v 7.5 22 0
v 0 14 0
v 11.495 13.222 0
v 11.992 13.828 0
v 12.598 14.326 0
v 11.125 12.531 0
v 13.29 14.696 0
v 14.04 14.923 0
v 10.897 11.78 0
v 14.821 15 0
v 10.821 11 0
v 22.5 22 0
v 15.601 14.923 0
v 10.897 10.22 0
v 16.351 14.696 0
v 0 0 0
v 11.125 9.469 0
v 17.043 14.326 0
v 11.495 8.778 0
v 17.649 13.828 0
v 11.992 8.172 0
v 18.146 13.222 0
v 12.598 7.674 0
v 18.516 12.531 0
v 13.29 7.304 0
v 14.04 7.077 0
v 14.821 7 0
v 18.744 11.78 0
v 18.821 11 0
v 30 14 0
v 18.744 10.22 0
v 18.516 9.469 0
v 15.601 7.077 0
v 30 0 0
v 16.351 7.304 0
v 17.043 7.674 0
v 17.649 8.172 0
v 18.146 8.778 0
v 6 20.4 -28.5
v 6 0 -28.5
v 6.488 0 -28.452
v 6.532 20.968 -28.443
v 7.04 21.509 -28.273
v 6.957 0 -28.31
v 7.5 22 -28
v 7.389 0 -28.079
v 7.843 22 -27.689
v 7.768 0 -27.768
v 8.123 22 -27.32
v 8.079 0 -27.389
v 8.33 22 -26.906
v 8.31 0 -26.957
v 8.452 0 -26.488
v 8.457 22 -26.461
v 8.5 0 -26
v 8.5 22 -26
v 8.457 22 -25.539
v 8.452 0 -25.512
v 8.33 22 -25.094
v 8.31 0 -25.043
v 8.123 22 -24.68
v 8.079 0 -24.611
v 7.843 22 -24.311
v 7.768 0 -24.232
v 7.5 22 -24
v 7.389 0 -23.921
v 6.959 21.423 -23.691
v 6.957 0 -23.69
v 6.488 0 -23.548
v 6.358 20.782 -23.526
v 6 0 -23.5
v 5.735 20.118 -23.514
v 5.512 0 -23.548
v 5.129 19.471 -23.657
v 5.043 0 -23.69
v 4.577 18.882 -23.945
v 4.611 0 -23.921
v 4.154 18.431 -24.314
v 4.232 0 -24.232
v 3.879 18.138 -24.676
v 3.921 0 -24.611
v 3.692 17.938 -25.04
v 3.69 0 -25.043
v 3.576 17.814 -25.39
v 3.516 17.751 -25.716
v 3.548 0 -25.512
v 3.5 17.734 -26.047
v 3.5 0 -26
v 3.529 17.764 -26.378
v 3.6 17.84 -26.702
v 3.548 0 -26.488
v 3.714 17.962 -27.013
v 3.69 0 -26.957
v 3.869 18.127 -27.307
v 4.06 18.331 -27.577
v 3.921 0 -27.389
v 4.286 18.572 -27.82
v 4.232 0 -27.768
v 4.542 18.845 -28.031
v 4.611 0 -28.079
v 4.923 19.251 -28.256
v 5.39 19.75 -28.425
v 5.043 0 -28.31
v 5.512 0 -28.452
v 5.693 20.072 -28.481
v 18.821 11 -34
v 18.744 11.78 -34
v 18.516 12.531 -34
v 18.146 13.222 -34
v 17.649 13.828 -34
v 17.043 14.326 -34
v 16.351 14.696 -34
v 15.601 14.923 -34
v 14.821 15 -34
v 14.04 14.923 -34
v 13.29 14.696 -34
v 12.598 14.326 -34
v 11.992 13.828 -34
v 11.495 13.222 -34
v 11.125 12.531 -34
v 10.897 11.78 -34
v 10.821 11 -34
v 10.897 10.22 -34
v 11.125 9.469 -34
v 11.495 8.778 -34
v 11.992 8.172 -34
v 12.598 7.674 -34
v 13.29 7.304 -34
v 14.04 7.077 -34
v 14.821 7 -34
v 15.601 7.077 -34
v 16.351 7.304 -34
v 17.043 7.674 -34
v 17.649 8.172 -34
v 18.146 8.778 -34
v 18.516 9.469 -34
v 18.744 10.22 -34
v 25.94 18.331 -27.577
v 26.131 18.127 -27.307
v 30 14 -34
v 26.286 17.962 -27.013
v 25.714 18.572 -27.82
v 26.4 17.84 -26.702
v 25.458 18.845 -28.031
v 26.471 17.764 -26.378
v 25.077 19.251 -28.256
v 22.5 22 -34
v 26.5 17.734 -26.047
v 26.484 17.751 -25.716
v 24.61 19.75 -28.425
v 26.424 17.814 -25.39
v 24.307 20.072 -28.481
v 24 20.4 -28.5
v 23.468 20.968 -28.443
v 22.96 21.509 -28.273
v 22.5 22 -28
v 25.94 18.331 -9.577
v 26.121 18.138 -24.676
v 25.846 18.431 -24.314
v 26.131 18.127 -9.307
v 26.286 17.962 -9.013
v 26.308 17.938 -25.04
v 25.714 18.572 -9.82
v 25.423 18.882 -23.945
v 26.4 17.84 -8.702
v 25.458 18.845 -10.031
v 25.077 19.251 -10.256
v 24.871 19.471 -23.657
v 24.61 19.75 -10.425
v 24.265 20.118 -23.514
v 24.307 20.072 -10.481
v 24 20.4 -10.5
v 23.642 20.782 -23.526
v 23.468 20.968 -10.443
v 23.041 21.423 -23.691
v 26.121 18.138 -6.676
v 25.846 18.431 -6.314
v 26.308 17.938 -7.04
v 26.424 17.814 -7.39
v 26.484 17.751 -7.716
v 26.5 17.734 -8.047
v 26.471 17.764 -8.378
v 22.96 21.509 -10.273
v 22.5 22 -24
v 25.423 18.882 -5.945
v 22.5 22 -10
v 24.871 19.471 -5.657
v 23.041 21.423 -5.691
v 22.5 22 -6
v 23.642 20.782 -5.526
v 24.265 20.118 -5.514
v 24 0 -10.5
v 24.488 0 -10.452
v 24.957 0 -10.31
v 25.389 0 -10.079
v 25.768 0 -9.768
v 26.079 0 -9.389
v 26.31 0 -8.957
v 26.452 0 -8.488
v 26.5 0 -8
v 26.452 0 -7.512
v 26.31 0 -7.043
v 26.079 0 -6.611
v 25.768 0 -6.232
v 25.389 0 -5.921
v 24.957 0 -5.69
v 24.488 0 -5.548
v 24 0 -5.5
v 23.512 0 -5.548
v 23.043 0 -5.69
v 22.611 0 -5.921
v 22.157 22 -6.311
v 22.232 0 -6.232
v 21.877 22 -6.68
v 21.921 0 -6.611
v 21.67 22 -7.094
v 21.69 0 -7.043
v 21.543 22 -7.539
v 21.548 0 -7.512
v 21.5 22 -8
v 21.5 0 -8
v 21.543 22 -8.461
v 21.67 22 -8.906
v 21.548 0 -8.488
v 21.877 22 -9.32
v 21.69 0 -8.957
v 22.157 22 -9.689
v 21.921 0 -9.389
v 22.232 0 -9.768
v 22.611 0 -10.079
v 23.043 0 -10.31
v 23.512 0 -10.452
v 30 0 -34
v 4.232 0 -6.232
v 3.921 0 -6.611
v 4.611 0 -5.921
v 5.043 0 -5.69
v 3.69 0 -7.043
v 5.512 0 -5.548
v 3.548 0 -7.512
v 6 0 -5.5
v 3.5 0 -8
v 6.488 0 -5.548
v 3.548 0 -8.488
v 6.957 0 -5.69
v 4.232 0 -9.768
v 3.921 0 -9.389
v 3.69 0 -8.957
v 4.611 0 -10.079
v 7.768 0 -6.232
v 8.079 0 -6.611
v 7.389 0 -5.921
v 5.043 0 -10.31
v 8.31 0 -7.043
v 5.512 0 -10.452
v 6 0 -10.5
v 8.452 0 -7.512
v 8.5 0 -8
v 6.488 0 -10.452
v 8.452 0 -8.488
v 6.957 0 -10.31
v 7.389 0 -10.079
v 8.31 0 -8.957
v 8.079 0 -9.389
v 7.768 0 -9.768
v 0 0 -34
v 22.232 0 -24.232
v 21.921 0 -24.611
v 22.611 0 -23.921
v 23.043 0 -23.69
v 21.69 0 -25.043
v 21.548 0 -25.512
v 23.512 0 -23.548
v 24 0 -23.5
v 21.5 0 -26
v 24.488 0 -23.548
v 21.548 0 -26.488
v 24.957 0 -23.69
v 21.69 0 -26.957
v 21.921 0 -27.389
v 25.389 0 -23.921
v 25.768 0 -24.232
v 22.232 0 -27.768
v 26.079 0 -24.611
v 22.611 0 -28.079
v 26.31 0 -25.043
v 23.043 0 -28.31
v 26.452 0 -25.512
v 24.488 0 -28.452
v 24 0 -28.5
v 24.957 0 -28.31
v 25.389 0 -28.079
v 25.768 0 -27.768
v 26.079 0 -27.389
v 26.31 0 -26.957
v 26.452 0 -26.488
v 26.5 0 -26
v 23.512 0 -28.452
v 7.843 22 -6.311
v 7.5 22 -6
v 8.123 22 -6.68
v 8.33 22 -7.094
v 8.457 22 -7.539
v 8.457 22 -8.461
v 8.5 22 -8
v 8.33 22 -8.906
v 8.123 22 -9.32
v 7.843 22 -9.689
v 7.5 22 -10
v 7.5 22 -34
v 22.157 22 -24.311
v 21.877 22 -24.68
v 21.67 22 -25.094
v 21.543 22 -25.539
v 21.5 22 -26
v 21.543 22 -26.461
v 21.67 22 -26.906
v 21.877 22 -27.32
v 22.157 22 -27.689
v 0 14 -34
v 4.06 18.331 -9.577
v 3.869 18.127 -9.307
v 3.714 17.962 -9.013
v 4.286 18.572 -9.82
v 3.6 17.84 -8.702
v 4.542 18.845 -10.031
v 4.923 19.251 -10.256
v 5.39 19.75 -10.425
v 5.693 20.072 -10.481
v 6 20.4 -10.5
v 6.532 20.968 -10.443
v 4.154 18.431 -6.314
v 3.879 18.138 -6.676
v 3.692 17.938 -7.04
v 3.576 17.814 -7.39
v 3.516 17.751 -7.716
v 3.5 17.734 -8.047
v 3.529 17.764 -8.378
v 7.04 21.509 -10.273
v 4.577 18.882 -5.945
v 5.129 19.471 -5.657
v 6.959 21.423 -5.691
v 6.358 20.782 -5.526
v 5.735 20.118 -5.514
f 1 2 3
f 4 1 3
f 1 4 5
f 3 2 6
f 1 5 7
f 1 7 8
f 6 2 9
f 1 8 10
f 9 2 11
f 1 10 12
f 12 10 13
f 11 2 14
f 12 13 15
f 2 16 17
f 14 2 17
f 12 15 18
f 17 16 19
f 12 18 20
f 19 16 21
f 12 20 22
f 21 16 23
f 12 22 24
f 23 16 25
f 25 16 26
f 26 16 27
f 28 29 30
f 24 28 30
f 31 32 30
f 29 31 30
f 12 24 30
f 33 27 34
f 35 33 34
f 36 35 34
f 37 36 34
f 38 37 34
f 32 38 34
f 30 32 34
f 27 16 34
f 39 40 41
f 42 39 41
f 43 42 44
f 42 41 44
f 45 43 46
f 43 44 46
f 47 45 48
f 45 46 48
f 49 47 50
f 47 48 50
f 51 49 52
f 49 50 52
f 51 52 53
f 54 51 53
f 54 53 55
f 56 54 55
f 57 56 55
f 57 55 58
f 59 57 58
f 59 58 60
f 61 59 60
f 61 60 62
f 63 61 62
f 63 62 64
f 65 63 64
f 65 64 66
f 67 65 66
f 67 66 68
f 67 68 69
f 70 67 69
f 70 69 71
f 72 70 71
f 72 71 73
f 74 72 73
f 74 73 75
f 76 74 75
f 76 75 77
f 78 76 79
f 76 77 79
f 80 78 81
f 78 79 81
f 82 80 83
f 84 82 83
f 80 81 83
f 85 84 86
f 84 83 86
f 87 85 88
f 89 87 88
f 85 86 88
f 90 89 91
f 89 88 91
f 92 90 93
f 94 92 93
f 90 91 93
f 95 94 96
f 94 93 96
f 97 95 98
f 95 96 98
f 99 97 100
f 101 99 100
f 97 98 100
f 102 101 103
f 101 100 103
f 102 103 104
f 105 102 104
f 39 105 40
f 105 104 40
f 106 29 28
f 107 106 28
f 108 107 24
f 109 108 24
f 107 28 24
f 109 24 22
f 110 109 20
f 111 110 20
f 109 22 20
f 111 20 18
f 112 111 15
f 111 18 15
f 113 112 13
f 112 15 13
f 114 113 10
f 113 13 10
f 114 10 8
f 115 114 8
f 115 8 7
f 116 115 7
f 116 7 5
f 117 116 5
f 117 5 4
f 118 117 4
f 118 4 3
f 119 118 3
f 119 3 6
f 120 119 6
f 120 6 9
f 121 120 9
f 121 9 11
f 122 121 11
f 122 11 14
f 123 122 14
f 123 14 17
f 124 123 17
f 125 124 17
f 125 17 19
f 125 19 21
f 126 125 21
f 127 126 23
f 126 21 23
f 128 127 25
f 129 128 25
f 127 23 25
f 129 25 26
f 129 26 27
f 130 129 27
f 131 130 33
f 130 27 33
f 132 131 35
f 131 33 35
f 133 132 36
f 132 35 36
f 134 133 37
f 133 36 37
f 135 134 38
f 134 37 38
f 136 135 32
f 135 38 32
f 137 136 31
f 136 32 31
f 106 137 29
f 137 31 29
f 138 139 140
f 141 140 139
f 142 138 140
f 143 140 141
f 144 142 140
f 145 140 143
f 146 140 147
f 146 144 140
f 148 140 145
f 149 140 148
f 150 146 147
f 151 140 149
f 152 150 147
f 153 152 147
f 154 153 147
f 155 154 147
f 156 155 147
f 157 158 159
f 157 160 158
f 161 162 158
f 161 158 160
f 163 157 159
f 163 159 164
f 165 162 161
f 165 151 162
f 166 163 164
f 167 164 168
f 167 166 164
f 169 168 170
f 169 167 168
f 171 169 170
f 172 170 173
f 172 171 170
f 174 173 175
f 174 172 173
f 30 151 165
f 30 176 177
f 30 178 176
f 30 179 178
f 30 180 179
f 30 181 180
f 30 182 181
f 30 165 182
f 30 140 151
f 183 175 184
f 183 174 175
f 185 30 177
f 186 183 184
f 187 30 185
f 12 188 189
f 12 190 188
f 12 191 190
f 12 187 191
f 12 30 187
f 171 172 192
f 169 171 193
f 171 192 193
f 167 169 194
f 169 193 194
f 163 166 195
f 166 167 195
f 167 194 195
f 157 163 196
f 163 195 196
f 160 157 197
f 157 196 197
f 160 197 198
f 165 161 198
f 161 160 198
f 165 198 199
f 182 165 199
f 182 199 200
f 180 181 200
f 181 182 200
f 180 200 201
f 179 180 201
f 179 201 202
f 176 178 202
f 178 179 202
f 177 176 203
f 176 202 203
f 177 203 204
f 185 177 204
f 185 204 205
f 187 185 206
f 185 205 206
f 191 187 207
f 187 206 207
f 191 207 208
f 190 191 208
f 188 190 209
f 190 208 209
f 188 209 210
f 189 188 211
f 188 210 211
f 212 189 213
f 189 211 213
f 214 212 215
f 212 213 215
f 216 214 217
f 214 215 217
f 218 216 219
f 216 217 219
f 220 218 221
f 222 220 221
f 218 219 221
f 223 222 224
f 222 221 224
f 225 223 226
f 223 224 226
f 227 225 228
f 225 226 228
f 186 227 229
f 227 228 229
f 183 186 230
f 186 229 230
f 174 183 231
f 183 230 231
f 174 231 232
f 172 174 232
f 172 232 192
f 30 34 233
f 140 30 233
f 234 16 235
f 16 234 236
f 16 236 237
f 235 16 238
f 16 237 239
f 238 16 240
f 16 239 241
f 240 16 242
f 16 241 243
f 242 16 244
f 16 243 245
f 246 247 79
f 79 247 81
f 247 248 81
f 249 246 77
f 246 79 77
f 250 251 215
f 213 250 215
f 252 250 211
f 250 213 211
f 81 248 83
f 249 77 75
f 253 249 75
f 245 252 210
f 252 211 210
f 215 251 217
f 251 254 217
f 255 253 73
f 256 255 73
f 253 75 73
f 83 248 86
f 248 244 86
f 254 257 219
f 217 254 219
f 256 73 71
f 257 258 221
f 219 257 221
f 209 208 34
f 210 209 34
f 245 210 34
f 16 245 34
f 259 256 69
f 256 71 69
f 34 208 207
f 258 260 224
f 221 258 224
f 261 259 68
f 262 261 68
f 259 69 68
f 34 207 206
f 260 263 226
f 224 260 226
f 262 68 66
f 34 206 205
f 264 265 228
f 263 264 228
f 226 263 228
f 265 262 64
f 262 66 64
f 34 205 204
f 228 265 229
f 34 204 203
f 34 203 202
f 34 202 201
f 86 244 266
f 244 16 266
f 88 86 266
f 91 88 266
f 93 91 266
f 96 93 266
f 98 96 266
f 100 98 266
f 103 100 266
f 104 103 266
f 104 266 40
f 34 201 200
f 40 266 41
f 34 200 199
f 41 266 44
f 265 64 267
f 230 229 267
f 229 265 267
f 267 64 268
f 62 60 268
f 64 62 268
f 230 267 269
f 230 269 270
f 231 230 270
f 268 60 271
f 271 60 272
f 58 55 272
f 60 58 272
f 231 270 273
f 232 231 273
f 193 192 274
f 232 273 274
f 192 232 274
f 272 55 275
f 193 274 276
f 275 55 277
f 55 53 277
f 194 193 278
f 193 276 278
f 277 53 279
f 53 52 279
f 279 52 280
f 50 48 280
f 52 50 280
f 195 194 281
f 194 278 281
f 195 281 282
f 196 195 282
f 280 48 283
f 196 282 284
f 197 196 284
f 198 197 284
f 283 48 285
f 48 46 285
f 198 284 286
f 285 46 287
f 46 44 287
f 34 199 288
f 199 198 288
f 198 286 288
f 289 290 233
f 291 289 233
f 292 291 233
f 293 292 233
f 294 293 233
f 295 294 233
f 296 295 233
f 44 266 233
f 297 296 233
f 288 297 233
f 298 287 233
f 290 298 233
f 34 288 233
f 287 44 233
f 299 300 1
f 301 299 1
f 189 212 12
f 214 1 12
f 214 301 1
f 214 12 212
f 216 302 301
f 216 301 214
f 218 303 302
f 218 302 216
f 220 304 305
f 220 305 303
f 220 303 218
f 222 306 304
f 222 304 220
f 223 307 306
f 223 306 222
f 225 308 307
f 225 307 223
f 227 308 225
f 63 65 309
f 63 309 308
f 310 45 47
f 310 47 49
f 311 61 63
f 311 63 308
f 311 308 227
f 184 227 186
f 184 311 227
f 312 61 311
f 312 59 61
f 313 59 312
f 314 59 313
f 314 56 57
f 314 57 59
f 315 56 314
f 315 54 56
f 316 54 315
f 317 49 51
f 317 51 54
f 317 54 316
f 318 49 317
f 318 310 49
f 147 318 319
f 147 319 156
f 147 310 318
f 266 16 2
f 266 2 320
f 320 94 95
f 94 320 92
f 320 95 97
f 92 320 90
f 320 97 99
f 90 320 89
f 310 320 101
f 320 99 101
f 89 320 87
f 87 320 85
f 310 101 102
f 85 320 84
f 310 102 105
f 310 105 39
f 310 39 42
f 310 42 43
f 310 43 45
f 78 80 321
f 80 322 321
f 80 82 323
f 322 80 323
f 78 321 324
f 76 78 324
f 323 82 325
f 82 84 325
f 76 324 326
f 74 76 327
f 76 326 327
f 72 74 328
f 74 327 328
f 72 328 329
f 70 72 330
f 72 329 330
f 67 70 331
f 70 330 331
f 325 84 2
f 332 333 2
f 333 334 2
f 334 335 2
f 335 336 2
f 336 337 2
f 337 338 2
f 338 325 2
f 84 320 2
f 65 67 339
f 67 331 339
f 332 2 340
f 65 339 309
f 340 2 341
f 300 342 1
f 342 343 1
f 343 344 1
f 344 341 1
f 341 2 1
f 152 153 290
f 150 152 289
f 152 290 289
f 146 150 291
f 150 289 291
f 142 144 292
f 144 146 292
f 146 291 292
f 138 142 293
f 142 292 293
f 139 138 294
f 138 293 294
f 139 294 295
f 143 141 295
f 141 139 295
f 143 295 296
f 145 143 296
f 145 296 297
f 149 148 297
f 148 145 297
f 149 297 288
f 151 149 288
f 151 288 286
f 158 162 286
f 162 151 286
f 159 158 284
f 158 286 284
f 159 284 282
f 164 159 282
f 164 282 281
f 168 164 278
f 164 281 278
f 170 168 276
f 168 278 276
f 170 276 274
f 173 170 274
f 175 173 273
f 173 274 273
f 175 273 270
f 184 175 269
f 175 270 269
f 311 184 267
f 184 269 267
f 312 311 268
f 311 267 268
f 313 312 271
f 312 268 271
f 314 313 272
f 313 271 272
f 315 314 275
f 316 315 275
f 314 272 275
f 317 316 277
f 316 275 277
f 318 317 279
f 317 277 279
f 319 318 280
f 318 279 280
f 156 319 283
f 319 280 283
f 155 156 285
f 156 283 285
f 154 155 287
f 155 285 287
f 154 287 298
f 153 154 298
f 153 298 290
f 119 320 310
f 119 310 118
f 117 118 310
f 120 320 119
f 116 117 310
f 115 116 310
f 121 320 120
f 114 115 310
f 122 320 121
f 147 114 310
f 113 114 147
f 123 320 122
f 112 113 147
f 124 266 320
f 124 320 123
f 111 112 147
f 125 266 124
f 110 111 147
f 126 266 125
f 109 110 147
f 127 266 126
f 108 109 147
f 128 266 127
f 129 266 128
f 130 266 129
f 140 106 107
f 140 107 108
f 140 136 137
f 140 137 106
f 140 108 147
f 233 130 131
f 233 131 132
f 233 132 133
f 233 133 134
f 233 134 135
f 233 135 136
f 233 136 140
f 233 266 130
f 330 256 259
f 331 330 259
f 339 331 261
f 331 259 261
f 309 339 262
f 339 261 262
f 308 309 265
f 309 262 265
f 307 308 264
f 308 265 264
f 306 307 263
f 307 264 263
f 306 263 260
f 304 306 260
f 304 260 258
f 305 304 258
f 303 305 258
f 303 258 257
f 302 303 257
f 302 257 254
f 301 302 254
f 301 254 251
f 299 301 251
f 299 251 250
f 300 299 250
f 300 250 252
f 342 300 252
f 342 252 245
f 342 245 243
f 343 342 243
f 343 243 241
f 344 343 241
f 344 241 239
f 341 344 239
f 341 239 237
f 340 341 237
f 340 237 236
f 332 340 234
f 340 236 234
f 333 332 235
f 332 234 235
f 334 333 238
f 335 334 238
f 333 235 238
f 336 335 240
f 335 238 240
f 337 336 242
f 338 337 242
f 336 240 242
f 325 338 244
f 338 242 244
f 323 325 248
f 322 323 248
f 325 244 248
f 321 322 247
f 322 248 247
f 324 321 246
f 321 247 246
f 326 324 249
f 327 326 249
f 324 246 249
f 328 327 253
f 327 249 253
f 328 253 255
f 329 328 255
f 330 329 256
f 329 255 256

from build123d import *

# Parameters (mm, degrees)
SKETCH1_W           = 30
SKETCH1_H           = 34
BOSS_EXTRUDE1_DEPTH = 22
CUT_EXTRUDE1_REACH  = 52.398
SKETCH2_R           = 4
SKETCH3_R           = 2.5
CUT_EXTRUDE2_DEPTH  = 22


with BuildPart() as part:
    # Sketch1 → Boss-Extrude1 (new body)
    with BuildSketch(Plane(origin=(0, 0, 0), x_dir=(1, 0, 0), z_dir=(0, 1, 0))):
        with Locations((15, 17)):
            Rectangle(SKETCH1_W, SKETCH1_H)
    extrude(amount=BOSS_EXTRUDE1_DEPTH)

    # Sketch2 → Cut-Extrude1 (cut, up to next)
    with BuildSketch(Plane.XY, mode=Mode.PRIVATE) as cut_extrude1_sk1:
        with Locations((14.820555819, 11)):
            Circle(SKETCH2_R)
    cut_extrude1_tool1 = extrude(cut_extrude1_sk1.sketch, amount=-CUT_EXTRUDE1_REACH, mode=Mode.PRIVATE) & part.part
    # Sketch2 → Cut-Extrude1 (cut, up to next)
    with BuildSketch(Plane.XY, mode=Mode.PRIVATE) as cut_extrude1_sk2:
        Polygon((0, 14), (7.5, 22), (0, 22), align=None)
    cut_extrude1_tool2 = extrude(cut_extrude1_sk2.sketch, amount=-CUT_EXTRUDE1_REACH, mode=Mode.PRIVATE) & part.part
    # Sketch2 → Cut-Extrude1 (cut, up to next)
    with BuildSketch(Plane.XY, mode=Mode.PRIVATE) as cut_extrude1_sk3:
        Polygon((30, 14), (22.5, 22), (30, 22), align=None)
    cut_extrude1_tool3 = extrude(cut_extrude1_sk3.sketch, amount=-CUT_EXTRUDE1_REACH, mode=Mode.PRIVATE) & part.part
    add(cut_extrude1_tool1.solids().sort_by_distance((14.820556, 11, 0))[0], mode=Mode.SUBTRACT)
    add(cut_extrude1_tool2.solids().sort_by_distance((2.5, 19.333333, 0))[0], mode=Mode.SUBTRACT)
    add(cut_extrude1_tool3.solids().sort_by_distance((27.5, 19.333333, 0))[0], mode=Mode.SUBTRACT)

    # Sketch3 → Cut-Extrude2 (cut)
    with BuildSketch(Plane.XZ):
        with Locations(Location((6, -8, 0), (0, 0, 270))):
            Circle(SKETCH3_R)
        with Locations(Location((24, -8, 0), (0, 0, 270))):
            Circle(SKETCH3_R)
        with Locations(Location((24, -26, 0), (0, 0, 270))):
            Circle(SKETCH3_R)
        with Locations(Location((6, -26, 0), (0, 0, 270))):
            Circle(SKETCH3_R)
    extrude(amount=-CUT_EXTRUDE2_DEPTH, mode=Mode.SUBTRACT)


solid = part.part
